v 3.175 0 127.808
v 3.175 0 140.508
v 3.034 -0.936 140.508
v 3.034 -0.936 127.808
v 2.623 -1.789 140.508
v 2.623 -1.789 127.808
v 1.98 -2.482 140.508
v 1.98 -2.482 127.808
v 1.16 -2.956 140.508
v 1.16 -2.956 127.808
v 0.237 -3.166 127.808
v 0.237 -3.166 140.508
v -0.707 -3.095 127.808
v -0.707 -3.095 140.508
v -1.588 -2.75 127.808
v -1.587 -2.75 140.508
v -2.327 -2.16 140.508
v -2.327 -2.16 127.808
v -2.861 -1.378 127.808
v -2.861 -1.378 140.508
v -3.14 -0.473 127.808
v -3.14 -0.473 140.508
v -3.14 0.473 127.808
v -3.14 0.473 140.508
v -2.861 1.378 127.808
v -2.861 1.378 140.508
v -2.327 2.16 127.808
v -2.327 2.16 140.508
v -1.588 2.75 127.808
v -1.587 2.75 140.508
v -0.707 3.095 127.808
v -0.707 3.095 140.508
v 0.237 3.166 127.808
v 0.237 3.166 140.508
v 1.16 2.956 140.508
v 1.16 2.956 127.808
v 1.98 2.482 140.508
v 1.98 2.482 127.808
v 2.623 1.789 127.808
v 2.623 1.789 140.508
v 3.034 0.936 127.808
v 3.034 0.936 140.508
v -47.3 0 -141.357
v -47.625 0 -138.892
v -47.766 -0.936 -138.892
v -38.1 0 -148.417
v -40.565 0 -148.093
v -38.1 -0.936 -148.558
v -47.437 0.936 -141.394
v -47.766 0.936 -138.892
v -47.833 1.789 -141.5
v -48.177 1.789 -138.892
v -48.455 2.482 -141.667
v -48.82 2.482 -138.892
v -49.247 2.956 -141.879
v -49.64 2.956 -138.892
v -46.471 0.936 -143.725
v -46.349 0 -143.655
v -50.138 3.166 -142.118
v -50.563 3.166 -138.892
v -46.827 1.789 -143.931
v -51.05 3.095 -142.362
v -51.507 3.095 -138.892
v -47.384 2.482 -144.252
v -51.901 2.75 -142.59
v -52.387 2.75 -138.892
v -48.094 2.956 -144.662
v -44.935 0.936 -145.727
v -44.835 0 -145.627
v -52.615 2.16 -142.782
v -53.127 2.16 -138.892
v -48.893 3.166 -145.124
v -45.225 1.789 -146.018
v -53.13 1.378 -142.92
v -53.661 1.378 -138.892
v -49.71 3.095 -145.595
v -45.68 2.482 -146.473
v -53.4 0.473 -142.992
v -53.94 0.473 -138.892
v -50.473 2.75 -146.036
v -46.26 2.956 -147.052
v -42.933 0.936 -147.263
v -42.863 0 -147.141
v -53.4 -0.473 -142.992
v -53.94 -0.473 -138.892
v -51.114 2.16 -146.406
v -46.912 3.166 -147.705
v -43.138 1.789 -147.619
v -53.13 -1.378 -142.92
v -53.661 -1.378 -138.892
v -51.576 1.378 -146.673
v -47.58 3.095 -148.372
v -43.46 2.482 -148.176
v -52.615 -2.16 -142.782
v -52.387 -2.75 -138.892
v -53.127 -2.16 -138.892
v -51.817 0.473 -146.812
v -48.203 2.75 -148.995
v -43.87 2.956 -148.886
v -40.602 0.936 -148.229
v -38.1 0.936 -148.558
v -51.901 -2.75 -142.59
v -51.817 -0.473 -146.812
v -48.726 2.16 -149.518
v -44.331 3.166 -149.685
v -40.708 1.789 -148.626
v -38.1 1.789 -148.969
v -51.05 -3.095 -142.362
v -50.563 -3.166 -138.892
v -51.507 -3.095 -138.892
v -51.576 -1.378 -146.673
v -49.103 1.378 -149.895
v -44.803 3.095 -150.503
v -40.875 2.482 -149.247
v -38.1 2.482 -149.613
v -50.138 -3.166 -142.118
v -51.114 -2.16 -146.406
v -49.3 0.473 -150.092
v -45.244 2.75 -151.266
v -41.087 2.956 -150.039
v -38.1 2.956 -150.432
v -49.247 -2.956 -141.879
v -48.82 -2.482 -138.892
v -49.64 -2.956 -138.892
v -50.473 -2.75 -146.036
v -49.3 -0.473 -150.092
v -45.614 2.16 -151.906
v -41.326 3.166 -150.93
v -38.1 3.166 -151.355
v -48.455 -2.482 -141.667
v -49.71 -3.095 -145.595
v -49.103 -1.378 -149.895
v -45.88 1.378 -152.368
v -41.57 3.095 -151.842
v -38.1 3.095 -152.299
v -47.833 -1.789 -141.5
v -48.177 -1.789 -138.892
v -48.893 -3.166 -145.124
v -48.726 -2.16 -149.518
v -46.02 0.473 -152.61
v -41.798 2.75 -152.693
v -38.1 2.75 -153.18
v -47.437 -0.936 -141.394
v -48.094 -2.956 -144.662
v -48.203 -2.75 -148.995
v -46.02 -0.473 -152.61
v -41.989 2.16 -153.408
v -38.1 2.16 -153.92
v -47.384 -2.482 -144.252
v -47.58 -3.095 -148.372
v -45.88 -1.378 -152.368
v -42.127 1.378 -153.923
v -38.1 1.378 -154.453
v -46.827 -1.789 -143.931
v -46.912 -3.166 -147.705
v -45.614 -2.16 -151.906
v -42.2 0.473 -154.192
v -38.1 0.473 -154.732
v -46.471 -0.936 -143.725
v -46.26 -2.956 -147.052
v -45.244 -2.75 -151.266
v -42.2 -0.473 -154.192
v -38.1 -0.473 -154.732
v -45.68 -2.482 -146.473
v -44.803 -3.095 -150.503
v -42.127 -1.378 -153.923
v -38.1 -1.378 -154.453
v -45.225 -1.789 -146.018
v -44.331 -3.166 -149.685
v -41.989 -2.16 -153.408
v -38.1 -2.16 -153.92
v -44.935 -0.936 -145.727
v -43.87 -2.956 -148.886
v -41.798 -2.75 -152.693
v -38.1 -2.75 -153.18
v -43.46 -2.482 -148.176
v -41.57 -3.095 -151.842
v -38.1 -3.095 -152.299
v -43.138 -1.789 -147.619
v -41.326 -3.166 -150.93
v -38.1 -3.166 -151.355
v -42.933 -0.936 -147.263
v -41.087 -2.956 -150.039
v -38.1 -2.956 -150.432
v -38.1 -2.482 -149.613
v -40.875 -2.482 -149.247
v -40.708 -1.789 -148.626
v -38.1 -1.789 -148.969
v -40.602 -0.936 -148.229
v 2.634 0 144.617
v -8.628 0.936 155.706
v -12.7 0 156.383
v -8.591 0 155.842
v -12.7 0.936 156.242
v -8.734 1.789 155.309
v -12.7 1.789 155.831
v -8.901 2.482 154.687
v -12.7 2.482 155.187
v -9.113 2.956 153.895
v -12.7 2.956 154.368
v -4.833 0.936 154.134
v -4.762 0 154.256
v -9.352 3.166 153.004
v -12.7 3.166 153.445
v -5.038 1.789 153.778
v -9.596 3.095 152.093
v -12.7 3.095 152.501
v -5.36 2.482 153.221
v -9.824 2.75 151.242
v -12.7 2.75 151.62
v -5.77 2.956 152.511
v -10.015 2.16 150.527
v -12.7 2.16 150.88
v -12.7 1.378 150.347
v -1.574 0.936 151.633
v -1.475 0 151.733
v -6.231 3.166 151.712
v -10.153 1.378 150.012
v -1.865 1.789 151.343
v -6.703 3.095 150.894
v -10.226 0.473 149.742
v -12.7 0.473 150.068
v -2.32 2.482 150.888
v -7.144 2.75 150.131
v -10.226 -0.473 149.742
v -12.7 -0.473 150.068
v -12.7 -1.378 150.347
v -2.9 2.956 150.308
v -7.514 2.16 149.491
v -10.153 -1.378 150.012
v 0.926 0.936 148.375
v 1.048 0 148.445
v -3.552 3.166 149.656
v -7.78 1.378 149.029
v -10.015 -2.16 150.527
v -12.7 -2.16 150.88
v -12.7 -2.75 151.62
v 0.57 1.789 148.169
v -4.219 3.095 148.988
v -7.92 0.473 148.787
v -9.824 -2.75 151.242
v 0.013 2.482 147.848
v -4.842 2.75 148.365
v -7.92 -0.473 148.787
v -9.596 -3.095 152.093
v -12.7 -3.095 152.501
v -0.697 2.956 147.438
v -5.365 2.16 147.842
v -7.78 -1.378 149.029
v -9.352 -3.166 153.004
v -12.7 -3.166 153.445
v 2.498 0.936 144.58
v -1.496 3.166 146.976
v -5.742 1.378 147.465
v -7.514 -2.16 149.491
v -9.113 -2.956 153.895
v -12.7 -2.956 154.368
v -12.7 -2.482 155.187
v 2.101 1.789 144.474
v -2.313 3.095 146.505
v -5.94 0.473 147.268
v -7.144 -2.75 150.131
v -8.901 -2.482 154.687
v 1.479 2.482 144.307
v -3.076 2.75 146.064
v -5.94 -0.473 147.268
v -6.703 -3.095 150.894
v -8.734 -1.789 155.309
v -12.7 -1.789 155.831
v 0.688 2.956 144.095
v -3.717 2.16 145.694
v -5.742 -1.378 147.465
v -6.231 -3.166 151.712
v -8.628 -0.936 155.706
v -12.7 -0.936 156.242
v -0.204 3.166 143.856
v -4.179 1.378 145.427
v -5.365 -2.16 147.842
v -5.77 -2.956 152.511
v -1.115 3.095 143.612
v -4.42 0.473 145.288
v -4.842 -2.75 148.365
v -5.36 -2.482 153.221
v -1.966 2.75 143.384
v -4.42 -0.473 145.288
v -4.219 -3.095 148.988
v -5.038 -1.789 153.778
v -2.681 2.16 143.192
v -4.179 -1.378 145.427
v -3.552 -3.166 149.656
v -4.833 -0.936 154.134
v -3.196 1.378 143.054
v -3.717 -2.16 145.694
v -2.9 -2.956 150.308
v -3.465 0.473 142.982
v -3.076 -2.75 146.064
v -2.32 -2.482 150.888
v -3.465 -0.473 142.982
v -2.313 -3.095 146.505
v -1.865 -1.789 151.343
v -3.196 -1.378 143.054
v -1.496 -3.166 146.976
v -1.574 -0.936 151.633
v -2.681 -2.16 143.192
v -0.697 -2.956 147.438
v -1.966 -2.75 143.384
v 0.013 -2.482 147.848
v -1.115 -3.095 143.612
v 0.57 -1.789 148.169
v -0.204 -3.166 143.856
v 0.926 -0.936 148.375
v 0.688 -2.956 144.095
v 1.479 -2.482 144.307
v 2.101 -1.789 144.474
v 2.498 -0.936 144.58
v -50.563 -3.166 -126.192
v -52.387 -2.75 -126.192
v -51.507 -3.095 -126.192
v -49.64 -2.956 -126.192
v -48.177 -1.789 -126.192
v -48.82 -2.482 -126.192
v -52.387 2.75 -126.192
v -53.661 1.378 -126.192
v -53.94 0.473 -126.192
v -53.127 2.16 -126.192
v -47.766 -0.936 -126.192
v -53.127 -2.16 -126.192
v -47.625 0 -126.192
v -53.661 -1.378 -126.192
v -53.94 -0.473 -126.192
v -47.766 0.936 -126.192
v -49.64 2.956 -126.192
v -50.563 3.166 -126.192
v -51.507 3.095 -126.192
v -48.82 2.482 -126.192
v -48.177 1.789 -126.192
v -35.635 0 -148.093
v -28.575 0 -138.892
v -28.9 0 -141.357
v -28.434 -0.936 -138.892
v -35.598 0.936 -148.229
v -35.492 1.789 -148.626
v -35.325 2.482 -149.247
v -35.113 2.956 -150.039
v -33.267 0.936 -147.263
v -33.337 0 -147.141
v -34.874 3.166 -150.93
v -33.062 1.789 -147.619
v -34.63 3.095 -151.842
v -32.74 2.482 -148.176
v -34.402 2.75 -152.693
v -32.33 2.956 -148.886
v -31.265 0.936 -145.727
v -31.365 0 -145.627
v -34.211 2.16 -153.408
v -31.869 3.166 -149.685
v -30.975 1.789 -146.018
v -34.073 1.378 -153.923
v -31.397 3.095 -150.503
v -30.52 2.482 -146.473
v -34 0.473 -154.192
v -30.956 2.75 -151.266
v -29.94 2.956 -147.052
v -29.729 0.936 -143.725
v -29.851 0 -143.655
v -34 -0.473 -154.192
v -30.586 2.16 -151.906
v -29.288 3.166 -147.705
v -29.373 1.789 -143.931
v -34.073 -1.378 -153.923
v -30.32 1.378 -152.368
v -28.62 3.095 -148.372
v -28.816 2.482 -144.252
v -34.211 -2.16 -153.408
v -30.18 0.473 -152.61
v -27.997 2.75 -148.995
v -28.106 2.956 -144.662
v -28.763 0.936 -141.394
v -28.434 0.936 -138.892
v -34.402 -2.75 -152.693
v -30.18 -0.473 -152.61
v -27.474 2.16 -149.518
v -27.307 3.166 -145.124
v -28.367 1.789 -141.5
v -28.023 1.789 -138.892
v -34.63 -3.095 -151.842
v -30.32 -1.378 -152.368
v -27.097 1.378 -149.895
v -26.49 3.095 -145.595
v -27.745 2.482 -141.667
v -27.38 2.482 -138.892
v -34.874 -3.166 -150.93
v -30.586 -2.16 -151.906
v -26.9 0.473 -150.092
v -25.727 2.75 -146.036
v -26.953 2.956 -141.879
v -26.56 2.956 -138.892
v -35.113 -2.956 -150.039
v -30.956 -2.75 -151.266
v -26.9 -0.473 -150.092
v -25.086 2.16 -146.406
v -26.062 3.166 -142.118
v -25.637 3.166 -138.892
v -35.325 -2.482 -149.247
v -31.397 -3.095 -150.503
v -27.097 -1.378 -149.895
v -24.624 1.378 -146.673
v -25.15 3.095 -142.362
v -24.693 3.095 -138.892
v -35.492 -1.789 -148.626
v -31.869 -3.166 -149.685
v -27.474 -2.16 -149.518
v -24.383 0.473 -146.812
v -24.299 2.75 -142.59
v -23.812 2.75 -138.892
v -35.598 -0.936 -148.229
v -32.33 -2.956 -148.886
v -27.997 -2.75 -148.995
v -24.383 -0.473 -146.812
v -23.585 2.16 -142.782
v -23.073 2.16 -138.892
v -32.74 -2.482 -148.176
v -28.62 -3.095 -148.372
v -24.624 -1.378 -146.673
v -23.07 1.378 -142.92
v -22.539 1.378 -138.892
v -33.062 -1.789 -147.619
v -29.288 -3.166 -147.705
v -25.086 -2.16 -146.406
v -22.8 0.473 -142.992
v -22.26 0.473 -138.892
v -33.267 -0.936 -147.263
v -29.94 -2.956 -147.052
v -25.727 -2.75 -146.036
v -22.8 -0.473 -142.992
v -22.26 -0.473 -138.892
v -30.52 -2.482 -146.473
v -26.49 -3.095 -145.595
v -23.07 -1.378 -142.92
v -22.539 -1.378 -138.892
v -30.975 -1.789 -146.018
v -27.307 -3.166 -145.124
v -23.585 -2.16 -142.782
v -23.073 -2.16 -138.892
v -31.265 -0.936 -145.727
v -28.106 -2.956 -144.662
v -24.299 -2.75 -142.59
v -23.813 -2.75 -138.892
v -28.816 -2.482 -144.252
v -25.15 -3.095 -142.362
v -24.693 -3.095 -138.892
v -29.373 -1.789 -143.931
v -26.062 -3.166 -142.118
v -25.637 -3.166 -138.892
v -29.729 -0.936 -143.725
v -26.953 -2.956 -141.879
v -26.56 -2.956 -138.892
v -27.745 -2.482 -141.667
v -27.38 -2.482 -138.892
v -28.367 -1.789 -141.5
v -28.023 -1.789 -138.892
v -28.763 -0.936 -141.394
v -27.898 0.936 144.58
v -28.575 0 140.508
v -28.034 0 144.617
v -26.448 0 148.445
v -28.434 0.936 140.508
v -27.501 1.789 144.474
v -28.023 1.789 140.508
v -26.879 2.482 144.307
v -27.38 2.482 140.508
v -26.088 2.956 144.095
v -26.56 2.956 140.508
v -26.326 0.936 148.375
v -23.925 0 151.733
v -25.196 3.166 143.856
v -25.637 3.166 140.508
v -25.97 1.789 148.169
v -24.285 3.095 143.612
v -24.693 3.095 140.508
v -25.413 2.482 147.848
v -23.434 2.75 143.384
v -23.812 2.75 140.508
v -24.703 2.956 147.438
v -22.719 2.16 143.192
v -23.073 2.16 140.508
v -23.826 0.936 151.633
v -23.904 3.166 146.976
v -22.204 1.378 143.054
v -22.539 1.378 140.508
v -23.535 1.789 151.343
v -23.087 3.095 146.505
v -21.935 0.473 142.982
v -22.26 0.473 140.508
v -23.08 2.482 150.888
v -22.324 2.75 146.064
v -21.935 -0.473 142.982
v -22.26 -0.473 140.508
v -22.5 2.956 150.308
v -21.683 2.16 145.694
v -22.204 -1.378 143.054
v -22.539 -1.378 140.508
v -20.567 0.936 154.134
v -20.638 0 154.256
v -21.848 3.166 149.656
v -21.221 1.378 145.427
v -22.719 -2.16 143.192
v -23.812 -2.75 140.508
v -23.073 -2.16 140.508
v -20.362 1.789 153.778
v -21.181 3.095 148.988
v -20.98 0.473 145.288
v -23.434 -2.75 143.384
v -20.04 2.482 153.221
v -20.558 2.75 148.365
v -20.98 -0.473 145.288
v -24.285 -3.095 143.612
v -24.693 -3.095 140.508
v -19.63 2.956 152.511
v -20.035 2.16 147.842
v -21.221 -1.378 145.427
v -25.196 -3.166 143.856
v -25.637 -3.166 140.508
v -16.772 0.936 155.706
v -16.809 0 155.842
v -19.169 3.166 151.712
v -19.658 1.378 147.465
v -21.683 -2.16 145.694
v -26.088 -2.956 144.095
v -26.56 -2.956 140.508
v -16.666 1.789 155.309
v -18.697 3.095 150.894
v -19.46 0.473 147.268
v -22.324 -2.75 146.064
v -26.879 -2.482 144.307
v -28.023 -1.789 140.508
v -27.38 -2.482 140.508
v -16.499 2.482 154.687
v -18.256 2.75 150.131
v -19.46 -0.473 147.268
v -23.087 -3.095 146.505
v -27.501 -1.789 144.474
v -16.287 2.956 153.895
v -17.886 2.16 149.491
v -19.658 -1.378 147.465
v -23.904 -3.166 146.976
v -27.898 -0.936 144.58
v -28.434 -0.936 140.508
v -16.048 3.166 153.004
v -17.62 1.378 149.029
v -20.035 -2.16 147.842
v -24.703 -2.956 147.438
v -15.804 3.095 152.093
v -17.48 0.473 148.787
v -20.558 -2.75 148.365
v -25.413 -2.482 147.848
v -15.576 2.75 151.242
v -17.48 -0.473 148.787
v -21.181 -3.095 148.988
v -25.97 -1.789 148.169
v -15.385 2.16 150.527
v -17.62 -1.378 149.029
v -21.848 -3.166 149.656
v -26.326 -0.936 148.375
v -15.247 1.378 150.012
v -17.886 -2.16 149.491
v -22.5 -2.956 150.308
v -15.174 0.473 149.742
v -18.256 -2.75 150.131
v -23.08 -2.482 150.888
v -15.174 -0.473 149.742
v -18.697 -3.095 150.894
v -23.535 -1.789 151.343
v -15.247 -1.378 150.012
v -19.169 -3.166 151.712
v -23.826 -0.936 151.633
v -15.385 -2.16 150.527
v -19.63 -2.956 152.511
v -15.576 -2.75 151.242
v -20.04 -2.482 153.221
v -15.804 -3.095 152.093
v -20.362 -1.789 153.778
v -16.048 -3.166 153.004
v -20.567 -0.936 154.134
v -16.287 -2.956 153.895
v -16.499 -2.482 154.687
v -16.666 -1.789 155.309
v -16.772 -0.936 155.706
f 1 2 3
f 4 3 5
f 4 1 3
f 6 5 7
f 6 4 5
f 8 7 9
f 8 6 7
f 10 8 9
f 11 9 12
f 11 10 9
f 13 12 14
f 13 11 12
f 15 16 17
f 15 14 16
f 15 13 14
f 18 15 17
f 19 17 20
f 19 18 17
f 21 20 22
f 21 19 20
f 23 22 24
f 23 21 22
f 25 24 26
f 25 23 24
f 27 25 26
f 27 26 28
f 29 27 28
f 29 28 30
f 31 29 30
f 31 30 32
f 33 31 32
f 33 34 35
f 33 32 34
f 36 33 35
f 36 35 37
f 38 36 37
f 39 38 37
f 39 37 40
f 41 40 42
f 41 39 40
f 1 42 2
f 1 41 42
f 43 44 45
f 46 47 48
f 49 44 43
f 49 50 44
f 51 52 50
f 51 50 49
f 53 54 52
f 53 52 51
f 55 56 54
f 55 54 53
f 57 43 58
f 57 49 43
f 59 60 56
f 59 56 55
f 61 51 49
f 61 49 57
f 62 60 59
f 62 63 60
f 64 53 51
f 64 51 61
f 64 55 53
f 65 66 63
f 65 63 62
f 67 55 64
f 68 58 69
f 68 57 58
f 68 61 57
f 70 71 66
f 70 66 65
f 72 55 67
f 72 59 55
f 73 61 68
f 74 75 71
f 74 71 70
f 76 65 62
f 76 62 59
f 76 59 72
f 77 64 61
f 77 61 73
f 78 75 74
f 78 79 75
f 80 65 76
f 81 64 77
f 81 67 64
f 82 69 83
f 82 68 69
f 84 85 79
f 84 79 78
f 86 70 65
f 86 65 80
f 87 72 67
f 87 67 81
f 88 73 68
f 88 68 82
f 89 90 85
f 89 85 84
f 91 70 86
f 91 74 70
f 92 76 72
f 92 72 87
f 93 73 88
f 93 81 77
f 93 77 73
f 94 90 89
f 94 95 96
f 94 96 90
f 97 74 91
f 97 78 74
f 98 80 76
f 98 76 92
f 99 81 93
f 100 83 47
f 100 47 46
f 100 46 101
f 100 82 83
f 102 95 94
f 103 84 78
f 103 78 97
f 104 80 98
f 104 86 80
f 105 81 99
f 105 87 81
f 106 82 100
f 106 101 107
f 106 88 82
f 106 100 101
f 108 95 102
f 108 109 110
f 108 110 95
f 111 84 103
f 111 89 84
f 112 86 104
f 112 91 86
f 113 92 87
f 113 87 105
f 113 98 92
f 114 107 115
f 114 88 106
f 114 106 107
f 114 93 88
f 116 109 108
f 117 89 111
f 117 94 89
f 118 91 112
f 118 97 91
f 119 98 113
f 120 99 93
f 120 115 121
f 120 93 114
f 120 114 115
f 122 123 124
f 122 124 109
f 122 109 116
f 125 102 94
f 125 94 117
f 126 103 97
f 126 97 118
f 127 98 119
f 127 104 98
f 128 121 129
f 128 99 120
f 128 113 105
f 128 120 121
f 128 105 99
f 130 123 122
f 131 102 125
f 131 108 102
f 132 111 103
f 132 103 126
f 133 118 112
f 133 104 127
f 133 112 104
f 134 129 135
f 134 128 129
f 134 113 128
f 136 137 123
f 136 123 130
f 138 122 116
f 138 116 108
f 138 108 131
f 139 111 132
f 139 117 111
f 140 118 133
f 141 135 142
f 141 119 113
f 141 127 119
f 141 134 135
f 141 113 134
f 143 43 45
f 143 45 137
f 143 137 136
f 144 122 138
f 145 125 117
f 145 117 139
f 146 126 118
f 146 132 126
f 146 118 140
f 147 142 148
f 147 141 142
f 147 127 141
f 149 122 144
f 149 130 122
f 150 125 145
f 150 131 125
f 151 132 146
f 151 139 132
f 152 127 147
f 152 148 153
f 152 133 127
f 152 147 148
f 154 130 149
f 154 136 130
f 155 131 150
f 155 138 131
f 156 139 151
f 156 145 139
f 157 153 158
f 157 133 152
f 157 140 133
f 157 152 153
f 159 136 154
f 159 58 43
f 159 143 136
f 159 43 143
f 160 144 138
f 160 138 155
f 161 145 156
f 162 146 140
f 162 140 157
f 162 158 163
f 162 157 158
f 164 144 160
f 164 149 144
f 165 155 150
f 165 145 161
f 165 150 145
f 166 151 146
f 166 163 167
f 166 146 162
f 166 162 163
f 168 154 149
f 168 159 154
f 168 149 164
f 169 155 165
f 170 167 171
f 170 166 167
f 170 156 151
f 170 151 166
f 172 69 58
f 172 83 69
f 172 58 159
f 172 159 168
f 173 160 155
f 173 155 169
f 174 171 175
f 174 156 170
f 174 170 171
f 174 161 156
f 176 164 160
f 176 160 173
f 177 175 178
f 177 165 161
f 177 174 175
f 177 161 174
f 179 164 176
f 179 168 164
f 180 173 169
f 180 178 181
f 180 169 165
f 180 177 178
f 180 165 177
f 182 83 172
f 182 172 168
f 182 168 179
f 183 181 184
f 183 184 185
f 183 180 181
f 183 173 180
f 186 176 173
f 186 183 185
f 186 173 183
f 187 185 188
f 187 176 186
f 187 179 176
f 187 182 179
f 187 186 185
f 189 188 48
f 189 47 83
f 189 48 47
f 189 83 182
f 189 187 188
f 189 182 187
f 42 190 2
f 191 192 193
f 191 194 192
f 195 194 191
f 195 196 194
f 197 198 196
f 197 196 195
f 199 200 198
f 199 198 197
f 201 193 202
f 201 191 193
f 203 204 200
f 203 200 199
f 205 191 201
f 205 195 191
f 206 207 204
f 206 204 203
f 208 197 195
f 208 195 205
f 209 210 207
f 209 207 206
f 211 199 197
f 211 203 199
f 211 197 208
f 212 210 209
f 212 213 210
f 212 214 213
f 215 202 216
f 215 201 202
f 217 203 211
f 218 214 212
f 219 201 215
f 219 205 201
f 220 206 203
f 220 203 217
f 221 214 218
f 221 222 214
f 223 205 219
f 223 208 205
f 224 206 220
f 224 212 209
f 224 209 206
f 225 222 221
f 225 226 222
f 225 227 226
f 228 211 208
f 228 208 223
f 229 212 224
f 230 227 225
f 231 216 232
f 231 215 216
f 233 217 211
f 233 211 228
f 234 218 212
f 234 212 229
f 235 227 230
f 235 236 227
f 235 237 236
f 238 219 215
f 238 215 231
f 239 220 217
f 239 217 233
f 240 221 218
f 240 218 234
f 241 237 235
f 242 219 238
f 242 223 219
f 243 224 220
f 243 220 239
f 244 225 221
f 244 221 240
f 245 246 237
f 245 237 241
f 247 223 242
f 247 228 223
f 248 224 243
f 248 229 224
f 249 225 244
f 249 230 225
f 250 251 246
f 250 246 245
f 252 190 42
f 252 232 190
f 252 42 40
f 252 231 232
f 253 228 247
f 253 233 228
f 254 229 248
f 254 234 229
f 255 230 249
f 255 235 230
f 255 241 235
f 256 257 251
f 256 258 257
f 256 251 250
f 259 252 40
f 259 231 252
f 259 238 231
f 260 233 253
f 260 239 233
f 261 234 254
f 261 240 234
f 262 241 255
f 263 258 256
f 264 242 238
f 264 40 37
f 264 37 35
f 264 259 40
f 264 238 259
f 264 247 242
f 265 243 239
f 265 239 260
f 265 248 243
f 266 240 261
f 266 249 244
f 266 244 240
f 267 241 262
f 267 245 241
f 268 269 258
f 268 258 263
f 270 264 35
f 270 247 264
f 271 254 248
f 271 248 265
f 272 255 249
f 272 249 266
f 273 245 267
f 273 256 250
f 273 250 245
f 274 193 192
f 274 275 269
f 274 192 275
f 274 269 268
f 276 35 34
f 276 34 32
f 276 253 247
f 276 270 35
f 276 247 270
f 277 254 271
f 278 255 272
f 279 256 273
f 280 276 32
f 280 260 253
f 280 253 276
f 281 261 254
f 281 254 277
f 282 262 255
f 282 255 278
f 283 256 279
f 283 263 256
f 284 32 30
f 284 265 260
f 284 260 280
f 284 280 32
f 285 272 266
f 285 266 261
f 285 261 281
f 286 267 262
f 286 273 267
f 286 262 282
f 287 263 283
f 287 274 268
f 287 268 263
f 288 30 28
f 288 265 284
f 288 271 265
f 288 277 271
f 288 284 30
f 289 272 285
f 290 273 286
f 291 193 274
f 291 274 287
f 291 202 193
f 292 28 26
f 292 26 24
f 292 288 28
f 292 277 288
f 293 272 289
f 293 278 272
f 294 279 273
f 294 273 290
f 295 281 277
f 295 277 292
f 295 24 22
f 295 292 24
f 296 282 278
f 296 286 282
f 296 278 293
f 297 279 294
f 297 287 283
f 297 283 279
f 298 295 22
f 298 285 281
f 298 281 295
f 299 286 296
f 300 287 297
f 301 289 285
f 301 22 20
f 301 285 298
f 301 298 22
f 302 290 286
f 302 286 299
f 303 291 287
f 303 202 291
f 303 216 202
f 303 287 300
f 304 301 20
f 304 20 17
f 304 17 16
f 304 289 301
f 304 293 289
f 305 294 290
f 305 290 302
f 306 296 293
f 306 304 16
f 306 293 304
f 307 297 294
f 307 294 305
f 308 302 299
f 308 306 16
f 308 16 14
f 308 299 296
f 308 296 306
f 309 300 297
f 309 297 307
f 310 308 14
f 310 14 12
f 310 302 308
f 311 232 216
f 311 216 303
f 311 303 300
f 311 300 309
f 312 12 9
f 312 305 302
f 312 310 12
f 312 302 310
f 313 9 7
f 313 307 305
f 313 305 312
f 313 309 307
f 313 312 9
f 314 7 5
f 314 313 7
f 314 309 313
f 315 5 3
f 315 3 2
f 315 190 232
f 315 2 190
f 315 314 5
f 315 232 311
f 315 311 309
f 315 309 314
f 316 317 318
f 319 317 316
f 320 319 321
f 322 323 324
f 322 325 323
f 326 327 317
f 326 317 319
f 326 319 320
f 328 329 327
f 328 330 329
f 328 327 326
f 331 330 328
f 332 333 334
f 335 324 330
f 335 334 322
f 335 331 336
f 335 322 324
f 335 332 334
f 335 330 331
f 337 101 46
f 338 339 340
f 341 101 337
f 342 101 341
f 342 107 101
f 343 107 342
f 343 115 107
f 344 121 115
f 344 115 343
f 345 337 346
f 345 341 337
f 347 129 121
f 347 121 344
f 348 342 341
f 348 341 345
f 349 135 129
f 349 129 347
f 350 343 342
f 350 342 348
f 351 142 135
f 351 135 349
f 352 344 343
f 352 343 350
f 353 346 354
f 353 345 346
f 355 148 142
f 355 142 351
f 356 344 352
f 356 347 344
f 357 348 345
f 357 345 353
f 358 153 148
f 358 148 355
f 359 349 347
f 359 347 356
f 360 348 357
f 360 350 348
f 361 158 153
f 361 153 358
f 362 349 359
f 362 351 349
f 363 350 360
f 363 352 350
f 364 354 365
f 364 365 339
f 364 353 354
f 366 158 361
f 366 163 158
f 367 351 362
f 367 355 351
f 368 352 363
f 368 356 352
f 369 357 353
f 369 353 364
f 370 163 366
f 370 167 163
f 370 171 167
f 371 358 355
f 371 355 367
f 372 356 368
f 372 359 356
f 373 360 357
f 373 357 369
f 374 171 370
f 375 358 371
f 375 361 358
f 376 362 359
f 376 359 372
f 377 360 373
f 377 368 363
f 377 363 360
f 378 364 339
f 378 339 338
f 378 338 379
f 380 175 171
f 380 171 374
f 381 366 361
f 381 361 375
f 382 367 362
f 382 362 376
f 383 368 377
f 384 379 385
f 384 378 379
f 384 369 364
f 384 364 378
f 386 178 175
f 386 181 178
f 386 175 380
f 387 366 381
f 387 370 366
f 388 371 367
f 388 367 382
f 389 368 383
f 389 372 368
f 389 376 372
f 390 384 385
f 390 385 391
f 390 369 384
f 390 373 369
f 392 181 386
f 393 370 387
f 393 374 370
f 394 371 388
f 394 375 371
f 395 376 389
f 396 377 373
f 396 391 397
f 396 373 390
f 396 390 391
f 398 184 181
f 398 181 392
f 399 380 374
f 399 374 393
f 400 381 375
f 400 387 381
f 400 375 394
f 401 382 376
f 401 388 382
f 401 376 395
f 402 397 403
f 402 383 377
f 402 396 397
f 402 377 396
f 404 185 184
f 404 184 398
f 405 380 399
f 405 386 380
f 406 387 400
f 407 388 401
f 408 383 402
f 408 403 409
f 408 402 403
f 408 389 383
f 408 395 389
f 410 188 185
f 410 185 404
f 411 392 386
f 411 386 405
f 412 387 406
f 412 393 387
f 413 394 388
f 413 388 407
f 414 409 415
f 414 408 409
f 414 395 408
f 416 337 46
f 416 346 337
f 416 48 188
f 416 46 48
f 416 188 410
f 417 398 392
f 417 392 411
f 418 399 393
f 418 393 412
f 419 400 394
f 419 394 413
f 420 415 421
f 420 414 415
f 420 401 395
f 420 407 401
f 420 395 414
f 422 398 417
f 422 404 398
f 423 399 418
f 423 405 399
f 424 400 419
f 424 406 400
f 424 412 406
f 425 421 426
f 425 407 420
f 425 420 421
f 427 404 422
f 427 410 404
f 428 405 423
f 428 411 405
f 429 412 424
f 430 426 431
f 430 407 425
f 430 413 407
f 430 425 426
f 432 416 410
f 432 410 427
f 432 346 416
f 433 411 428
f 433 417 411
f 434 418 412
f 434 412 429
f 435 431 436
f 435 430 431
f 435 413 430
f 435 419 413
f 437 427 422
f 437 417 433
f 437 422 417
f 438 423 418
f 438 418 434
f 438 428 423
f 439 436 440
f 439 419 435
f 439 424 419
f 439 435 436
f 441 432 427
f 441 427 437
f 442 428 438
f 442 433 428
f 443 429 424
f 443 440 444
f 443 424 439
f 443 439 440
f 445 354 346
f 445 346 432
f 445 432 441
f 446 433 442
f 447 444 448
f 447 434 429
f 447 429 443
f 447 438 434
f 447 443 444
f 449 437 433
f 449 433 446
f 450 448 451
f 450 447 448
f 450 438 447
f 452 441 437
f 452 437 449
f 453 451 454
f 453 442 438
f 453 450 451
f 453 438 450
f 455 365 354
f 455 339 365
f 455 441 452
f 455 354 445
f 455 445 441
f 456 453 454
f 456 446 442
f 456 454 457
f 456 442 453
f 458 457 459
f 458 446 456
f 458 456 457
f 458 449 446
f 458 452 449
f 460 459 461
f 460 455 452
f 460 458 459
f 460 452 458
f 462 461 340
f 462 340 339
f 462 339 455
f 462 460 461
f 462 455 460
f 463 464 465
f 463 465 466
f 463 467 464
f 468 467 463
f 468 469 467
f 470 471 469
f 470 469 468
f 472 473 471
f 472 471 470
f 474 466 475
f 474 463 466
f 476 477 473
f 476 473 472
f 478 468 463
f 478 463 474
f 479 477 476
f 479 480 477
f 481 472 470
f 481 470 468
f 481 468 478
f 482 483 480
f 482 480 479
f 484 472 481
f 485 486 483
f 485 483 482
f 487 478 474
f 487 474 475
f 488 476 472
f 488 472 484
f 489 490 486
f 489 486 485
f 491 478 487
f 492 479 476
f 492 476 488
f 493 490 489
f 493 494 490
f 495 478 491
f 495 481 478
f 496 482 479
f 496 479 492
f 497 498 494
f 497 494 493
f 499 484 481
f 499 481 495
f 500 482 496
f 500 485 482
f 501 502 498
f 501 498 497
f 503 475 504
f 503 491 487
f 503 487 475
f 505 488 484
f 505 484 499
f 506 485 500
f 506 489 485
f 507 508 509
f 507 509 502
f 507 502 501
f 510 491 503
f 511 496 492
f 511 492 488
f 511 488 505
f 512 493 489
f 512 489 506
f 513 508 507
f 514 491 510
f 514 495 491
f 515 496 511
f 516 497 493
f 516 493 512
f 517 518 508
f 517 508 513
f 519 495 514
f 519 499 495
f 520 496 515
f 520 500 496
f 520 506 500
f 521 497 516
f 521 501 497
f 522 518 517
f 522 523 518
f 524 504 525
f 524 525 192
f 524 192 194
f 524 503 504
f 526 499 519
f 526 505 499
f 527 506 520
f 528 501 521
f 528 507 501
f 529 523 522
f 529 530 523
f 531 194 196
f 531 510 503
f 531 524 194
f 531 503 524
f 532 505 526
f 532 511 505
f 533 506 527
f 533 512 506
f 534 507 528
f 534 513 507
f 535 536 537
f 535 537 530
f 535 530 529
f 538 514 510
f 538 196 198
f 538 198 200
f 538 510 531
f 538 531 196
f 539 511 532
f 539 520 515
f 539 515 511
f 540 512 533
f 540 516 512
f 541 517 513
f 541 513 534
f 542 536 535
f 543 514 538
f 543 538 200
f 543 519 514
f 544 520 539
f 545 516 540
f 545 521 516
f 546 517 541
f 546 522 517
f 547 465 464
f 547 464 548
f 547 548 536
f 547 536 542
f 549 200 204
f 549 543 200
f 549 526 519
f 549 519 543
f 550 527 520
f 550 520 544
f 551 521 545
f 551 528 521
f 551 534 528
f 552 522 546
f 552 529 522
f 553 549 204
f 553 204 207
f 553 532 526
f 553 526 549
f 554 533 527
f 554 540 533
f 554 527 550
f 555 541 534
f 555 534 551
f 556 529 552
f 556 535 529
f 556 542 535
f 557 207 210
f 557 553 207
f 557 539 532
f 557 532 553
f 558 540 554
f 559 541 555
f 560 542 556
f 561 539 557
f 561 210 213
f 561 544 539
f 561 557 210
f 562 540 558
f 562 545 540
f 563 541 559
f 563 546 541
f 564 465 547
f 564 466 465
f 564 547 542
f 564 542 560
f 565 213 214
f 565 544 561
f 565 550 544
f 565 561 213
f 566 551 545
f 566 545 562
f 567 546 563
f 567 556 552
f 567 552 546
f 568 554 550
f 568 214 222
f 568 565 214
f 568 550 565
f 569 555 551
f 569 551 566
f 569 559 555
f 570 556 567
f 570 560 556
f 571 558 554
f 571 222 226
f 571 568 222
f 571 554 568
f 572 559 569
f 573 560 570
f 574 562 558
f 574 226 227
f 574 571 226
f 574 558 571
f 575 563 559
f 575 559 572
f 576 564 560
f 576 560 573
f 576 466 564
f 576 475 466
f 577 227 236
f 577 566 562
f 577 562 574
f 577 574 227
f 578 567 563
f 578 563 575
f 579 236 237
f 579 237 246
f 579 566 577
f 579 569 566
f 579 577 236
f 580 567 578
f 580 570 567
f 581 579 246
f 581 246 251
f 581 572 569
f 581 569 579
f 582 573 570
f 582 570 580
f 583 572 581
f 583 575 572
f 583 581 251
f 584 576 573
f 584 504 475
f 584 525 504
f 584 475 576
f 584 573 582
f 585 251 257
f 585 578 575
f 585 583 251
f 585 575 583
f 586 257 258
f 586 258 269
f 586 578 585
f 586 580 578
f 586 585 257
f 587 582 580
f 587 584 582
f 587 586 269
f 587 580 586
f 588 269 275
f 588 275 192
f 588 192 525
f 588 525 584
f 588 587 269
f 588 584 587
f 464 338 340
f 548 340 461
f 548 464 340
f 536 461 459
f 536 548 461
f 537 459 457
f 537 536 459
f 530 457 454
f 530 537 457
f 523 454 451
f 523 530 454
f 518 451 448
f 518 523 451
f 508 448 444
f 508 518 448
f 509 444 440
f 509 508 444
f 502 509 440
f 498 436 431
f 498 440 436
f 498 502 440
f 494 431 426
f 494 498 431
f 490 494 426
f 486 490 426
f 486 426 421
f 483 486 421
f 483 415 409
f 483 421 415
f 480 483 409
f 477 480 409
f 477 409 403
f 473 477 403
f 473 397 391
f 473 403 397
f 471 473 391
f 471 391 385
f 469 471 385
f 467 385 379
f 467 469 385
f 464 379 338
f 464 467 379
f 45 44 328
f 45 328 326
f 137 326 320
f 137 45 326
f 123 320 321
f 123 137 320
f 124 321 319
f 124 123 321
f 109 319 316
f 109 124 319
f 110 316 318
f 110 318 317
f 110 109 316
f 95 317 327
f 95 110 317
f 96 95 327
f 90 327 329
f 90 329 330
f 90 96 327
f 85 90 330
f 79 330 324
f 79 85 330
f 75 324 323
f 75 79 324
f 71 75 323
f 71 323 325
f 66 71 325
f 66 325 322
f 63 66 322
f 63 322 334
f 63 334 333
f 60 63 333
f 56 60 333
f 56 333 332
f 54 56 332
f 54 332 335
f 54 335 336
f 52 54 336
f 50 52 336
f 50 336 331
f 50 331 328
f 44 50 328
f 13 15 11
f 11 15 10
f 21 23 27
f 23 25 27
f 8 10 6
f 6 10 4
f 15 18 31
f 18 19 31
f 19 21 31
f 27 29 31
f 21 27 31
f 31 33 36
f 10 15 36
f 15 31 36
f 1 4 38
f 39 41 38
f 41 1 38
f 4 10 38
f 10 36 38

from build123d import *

# Parameters (mm, degrees)
F2_R = 3.175


with BuildPart() as f3:
    # F3: sweep along a path in F0
    with BuildLine(Plane.XZ) as f3_path:
        Line((-50.8, -126.1922290944), (-50.8, -138.8922290944))
        ThreePointArc((-50.8, -138.8922290944), (-47.0802561211, -147.8724852155), (-38.1, -151.5922290944))
        ThreePointArc((-38.1, -151.5922290944), (-29.1197438789, -147.8724852155), (-25.4, -138.8922290944))
        Line((-25.4, -138.8922290944), (-25.4, 140.5077709056))
        ThreePointArc((-25.4, 140.5077709056), (-21.6802561211, 149.4880270267), (-12.7, 153.2077709056))
        ThreePointArc((-12.7, 153.2077709056), (-3.7197438789, 149.4880270267), (0, 140.5077709056))
        Line((0, 140.5077709056), (0, 127.8077709056))
    # F2 (on plane+point) → F3 (sweep)
    with BuildSketch(Plane.XY.offset(-126.1922290944)):
        with Locations((-50.8, 0)):
            Circle(F2_R)
    sweep(path=f3_path.line)


solid = f3.part
